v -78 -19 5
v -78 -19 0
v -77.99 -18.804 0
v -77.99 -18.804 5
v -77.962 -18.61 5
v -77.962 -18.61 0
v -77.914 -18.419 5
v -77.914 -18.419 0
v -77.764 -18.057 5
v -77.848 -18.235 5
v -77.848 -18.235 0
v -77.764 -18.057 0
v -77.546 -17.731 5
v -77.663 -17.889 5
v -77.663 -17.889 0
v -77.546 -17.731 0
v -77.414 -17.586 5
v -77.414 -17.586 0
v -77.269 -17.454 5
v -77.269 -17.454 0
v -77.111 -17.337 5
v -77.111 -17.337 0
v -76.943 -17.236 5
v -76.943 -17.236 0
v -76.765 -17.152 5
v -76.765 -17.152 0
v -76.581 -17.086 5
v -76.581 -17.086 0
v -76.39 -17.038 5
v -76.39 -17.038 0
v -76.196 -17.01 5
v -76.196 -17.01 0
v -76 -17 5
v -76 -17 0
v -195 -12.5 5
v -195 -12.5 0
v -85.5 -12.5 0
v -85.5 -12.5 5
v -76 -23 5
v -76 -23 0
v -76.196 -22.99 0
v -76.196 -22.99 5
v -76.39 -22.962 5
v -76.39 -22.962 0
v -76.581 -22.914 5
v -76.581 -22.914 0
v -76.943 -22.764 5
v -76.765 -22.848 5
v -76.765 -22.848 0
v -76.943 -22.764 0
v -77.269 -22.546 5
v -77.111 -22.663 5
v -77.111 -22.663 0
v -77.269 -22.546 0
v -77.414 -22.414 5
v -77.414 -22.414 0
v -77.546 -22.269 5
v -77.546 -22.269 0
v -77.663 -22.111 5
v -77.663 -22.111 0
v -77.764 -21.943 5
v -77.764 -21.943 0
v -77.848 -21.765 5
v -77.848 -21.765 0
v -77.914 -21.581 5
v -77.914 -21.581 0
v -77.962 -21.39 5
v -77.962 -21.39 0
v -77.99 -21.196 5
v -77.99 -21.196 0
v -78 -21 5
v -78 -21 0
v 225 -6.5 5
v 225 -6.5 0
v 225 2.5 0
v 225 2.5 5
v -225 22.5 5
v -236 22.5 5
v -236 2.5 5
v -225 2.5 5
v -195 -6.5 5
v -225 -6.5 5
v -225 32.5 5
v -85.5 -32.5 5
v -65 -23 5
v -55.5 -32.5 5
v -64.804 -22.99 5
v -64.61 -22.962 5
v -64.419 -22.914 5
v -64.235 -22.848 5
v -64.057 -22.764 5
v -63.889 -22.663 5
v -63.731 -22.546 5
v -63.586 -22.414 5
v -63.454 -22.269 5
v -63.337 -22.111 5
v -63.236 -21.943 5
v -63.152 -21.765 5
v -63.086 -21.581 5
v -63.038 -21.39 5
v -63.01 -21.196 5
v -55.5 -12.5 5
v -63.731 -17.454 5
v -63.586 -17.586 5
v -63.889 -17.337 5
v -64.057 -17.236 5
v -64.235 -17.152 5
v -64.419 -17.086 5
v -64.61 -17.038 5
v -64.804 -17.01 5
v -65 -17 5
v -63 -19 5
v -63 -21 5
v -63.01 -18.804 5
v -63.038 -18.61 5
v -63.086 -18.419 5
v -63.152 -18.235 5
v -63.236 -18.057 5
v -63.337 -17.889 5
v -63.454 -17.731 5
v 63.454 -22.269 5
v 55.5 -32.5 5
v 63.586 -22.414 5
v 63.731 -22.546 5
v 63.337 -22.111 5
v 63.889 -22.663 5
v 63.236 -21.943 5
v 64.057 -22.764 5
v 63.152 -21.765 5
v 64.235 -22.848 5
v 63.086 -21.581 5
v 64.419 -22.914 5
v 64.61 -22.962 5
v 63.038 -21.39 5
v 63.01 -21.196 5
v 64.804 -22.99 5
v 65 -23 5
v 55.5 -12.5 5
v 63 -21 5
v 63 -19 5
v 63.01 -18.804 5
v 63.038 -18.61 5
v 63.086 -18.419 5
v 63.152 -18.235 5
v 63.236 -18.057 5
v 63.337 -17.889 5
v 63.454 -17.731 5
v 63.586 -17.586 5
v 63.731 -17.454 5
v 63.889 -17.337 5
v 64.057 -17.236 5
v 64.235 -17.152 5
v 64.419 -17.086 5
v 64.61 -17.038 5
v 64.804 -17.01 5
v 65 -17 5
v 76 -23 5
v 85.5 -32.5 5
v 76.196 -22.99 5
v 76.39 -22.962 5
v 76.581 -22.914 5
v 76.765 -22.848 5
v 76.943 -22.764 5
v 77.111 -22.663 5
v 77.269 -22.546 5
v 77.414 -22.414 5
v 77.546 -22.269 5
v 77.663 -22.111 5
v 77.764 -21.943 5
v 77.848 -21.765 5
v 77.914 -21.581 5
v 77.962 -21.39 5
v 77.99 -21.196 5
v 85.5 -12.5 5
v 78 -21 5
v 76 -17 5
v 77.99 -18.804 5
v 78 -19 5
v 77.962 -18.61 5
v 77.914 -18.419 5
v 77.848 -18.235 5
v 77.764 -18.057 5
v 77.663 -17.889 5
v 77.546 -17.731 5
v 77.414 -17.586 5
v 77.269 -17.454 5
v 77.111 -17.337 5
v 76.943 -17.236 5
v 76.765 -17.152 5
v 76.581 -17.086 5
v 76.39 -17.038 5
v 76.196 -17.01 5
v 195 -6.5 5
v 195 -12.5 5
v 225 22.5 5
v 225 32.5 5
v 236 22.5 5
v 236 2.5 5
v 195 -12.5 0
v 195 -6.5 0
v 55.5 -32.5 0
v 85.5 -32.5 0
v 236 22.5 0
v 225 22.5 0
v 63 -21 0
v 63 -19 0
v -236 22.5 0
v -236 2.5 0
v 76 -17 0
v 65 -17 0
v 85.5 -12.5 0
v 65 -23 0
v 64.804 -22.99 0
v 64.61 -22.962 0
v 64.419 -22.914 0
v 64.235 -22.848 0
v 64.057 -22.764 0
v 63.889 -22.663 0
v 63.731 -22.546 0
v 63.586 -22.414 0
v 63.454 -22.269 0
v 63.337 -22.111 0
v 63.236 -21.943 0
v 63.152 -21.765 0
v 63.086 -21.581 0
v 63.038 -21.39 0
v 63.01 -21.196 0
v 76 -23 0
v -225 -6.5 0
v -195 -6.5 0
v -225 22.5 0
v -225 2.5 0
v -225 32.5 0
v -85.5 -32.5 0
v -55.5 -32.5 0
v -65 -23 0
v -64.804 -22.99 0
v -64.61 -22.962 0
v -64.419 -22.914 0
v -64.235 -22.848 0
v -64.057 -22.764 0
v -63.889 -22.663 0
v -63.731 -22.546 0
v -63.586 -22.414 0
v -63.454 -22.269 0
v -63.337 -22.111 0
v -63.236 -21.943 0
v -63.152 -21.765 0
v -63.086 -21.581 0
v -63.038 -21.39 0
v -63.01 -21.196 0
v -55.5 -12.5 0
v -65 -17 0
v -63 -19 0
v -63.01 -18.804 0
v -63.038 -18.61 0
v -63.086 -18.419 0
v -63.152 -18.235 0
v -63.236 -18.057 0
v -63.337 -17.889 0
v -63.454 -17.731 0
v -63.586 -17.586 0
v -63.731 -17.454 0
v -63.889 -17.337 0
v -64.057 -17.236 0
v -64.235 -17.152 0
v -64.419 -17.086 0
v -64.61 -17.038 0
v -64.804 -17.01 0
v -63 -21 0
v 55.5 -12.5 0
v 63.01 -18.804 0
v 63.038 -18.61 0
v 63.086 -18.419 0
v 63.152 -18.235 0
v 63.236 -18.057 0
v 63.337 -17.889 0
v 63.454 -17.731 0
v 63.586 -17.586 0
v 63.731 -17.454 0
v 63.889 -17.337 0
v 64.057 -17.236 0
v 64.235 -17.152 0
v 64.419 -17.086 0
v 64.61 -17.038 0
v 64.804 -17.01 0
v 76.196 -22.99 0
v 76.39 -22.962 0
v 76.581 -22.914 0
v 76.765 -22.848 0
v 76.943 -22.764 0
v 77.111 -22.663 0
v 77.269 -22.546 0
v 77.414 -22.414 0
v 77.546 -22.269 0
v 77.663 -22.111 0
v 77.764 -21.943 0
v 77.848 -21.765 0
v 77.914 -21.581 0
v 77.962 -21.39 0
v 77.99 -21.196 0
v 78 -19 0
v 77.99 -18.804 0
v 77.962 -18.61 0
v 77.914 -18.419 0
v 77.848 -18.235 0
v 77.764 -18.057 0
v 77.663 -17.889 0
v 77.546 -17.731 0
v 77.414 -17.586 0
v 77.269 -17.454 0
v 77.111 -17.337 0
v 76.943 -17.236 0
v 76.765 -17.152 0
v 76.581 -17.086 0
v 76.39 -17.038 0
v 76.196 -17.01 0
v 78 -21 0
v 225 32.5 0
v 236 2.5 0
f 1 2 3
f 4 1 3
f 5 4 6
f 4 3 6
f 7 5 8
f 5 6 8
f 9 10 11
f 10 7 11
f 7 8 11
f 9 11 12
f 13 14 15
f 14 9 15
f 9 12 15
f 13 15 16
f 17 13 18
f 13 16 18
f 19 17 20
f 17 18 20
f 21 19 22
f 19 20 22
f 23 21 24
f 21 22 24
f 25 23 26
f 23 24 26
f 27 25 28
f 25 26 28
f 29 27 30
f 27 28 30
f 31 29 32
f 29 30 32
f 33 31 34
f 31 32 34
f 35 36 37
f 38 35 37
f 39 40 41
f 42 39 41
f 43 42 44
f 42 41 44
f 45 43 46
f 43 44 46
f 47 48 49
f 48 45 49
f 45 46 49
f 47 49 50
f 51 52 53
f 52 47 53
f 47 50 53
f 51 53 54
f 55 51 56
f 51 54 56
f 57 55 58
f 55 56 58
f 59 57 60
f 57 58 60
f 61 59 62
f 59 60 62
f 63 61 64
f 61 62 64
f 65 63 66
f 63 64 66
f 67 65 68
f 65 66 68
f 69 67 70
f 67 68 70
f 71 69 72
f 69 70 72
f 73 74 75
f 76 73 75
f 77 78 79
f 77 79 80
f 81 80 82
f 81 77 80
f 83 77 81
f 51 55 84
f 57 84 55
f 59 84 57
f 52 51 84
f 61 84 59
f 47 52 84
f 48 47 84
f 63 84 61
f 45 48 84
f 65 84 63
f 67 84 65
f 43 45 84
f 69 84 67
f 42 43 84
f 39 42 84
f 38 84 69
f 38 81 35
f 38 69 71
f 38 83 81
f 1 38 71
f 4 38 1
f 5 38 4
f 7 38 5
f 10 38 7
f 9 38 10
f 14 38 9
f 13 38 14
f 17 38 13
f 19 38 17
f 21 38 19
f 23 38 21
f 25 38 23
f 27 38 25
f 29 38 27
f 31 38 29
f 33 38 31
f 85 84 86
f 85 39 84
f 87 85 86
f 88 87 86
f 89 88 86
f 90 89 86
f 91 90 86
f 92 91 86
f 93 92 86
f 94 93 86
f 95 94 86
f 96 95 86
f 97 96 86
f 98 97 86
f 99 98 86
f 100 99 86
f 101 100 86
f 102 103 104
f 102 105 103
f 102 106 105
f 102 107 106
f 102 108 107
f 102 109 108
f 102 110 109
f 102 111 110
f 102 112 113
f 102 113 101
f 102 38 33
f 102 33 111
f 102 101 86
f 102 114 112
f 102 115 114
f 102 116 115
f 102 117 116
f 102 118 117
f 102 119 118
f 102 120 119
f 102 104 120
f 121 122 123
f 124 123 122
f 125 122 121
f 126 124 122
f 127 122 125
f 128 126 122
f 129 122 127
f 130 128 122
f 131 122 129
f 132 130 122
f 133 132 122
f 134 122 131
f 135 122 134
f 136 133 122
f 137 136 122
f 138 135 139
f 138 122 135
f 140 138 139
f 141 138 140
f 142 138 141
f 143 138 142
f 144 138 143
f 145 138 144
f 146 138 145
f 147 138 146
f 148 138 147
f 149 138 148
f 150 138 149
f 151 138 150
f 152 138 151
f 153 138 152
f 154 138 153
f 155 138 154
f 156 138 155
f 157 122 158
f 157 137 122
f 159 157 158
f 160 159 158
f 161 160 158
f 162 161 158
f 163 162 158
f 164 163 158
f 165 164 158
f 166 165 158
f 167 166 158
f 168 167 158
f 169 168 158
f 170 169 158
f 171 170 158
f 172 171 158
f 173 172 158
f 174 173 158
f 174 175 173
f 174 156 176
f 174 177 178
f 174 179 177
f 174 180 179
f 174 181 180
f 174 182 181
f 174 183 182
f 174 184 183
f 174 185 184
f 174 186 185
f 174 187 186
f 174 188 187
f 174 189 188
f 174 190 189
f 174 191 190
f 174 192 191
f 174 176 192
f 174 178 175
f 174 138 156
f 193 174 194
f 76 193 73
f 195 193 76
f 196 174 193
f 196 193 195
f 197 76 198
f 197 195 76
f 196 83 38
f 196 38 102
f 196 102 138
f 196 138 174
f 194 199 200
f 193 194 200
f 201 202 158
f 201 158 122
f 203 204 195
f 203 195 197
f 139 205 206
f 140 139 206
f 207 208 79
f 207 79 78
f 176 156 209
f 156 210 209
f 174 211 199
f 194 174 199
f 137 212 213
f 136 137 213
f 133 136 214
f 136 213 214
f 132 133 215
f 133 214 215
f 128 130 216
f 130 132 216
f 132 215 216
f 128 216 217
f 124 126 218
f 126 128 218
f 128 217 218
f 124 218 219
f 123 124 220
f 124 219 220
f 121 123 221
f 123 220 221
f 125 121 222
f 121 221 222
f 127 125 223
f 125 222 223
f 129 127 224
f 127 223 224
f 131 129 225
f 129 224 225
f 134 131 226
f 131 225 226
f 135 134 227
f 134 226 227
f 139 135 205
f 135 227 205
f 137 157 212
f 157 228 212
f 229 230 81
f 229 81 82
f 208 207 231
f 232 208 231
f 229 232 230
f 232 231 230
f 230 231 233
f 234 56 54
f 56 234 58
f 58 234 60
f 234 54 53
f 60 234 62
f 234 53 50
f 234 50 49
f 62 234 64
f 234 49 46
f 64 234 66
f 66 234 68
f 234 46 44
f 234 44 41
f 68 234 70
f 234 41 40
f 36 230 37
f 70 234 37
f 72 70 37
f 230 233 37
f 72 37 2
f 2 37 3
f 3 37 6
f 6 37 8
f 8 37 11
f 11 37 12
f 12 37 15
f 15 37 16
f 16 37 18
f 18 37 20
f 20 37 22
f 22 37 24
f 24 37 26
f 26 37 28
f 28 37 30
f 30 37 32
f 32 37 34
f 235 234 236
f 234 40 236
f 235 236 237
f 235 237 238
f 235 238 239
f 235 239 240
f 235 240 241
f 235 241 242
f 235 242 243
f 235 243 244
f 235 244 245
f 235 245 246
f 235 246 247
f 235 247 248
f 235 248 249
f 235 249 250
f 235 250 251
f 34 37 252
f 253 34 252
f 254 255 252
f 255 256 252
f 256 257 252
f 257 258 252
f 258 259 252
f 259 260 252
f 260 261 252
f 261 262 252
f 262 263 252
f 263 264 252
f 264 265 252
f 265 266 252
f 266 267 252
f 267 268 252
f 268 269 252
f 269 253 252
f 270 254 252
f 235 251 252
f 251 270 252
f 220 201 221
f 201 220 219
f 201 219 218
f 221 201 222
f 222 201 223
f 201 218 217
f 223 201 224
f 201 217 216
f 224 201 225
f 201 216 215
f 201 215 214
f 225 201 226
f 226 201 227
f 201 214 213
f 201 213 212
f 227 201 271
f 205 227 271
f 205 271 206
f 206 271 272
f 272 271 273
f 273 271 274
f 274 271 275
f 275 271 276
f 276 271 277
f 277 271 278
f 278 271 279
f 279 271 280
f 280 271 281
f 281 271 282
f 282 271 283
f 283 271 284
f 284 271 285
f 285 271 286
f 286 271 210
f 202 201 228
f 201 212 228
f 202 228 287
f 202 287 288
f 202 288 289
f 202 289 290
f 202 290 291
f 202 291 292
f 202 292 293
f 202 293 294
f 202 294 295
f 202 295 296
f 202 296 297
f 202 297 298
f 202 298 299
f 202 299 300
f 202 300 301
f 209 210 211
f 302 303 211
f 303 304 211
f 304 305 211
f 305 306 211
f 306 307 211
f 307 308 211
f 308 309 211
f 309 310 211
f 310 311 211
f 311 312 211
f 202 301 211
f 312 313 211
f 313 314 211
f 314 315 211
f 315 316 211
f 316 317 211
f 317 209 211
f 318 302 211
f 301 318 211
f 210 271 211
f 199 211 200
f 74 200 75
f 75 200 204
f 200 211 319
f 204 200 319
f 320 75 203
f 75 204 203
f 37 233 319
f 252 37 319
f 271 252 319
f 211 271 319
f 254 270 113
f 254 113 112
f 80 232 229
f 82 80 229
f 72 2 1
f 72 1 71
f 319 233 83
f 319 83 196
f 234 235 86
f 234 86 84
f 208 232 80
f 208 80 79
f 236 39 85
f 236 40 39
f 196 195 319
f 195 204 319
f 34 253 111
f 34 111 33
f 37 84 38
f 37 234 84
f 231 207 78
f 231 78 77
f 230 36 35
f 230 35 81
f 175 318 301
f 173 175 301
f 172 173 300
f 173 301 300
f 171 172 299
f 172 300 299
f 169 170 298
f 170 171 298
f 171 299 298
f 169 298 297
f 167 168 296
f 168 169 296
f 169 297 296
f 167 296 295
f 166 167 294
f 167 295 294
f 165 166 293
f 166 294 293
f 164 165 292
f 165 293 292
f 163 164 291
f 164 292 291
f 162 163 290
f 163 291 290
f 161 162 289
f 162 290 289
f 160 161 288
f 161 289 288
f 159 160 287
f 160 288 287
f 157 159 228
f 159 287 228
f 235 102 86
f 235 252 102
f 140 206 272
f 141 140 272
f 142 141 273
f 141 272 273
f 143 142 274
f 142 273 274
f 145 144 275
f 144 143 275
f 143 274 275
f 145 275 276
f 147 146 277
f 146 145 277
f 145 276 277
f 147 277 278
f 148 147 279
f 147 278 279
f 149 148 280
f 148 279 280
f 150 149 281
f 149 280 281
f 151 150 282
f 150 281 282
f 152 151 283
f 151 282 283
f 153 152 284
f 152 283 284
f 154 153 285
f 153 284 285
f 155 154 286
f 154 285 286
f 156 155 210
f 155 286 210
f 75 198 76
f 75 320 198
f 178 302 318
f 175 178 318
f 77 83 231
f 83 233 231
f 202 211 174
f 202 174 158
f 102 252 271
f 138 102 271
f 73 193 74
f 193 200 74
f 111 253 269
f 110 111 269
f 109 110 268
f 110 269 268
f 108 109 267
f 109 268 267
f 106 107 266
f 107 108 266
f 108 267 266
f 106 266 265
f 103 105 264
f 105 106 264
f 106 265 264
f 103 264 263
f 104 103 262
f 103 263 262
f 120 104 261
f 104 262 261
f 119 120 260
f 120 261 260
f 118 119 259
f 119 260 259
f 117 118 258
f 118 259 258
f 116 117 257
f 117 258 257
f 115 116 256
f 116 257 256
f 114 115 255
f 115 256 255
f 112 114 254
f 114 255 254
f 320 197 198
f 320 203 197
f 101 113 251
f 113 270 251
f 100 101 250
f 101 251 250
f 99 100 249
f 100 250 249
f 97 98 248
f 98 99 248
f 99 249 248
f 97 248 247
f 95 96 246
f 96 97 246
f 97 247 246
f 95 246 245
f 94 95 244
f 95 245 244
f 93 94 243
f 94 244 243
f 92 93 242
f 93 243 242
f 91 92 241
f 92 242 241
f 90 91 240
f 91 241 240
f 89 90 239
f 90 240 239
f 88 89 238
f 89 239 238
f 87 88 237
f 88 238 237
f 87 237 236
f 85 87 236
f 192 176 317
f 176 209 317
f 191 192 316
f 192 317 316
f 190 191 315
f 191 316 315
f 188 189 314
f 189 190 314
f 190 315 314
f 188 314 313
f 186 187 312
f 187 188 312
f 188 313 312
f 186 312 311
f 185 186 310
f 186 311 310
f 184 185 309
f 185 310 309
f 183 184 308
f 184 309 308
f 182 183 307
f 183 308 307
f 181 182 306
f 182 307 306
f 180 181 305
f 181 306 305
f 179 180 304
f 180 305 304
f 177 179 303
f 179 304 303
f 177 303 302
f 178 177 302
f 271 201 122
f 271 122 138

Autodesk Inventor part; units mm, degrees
ref_plane "YZ Plane" through (0, 0, 0) normal (1, 0, 0) x (0, 1, 0)
ref_plane "XZ Plane" through (0, 0, 0) normal (0, 1, 0) x (-1, 0, 0)
ref_plane "XY Plane" through (0, 0, 0) normal (0, 0, 1) x (1, 0, 0)
sketch "Szkic1" plane through (0, 0, 0) normal (0, 0, 1) x (1, 0, 0)
  line L0 (-236, 32.5) -> (236, 32.5)
  line L1 (236, 32.5) -> (236, -32.5)
  line L2 (236, -32.5) -> (-236, -32.5)
  line L3 (-236, -32.5) -> (-236, 32.5)
  line L4 (-236, 32.5) -> (236, -32.5) construction
  line L5 (236, 32.5) -> (-236, -32.5) construction
  line L6 (-225, -12.5) -> (225, -12.5)
  line L7 (225, -12.5) -> (225, 32.5)
  line L8 (225, 32.5) -> (-225, 32.5)
  line L9 (-225, 32.5) -> (-225, -12.5)
  line L10 (-225, -12.5) -> (225, 32.5) construction
  line L11 (225, -12.5) -> (-225, 32.5) construction
  line L12 (-236, 22.5) -> (-225, 22.5)
  line L13 (-225, 22.5) -> (-225, 2.5)
  line L14 (-225, 2.5) -> (-236, 2.5)
  line L15 (-236, 2.5) -> (-236, 22.5)
  line L16 (225, 22.5) -> (236, 22.5)
  line L17 (236, 22.5) -> (236, 2.5)
  line L18 (236, 2.5) -> (225, 2.5)
  line L19 (225, 2.5) -> (225, 22.5)
  line L20 (-85.5, -12.5) -> (-55.5, -12.5)
  line L21 (-55.5, -12.5) -> (-55.5, -32.5)
  line L22 (-55.5, -32.5) -> (-85.5, -32.5)
  line L23 (-85.5, -32.5) -> (-85.5, -12.5)
  line L24 (-85.5, -12.5) -> (-55.5, -32.5) construction
  line L25 (-55.5, -12.5) -> (-85.5, -32.5) construction
  line L26 (55.5, -12.5) -> (85.5, -12.5)
  line L27 (85.5, -12.5) -> (85.5, -32.5)
  line L28 (85.5, -32.5) -> (55.5, -32.5)
  line L29 (55.5, -32.5) -> (55.5, -12.5)
  line L30 (55.5, -12.5) -> (85.5, -32.5) construction
  line L31 (85.5, -12.5) -> (55.5, -32.5) construction
  line L32 (-76, -23) -> (-65, -23)
  line L33 (-63, -21) -> (-63, -19)
  line L34 (-65, -17) -> (-76, -17)
  line L35 (-78, -19) -> (-78, -21)
  line L36 (-78, -23) -> (-63, -17) construction
  line L37 (-63, -23) -> (-78, -17) construction
  line L38 (65, -17) -> (76, -17)
  line L39 (78, -19) -> (78, -21)
  line L40 (76, -23) -> (65, -23)
  line L41 (63, -21) -> (63, -19)
  line L42 (63, -17) -> (78, -23) construction
  line L43 (78, -17) -> (63, -23) construction
  arc A0 (-65, -23) -> (-63, -21) centre (-65, -21) ccw
  arc A1 (-63, -19) -> (-65, -17) centre (-65, -19) ccw
  arc A2 (-76, -17) -> (-78, -19) centre (-76, -19) ccw
  arc A3 (-78, -21) -> (-76, -23) centre (-76, -21) ccw
  arc A4 (63, -21) -> (65, -23) centre (65, -21) ccw
  arc A5 (65, -17) -> (63, -19) centre (65, -19) ccw
  arc A6 (78, -19) -> (76, -17) centre (76, -19) ccw
  arc A7 (76, -23) -> (78, -21) centre (76, -21) ccw
  line L44 (225, -12.5) -> (195, -12.5)
  line L45 (195, -12.5) -> (195, -6.5)
  line L46 (195, -6.5) -> (225, -6.5)
  line L47 (225, -6.5) -> (225, -12.5)
  line L48 (-225, -12.5) -> (-195, -12.5)
  line L49 (-195, -12.5) -> (-195, -6.5)
  line L50 (-195, -6.5) -> (-225, -6.5)
  line L51 (-225, -6.5) -> (-225, -12.5)
  point P0 (0, 0)
  point P1 (0, 0)
  point P2 (-70.5, -22.5)
  point P3 (70.5, -22.5)
  point P4 (-70.5, -20)
  point P5 (70.5, -20)
  dimension "d0" = 472
  dimension "d1" = 65
  dimension "d2" = 450
  dimension "d3" = 45
  dimension "d4" = 10
  dimension "d5" = 11
  dimension "d6" = 20
  dimension "d7" = 10
  dimension "d8" = 20
  dimension "d9" = 141
  dimension "d10" = 20
  dimension "d11" = 20
  dimension "d12" = 30
  dimension "d13" = 30
  dimension "d15" = 70.5
  dimension "d16" = 15
  dimension "d17" = 6
  dimension "d18" = 4.5
  dimension "d19" = 15
  dimension "d20" = 6
  dimension "d21" = 4.5
  dimension "d22" = 2
  dimension "d25" = 30
  dimension "d26" = 6
  dimension "d27" = 30
  dimension "d28" = 6
extrude "Wyciągnięcie proste1" add sketch "Szkic1" along normal blind 5 contours L0 L7 L46 L45 L6 L49 L50 L9 | L12 L9 L14 L3 | L16 L1 L18 L7 | L23 L6 L21 L2 | L29 L6 L27 L2
equation "\"d15\" = 0.5 * d9"
equation "\"d21\" = d18"
properties part number "poprz_690"
